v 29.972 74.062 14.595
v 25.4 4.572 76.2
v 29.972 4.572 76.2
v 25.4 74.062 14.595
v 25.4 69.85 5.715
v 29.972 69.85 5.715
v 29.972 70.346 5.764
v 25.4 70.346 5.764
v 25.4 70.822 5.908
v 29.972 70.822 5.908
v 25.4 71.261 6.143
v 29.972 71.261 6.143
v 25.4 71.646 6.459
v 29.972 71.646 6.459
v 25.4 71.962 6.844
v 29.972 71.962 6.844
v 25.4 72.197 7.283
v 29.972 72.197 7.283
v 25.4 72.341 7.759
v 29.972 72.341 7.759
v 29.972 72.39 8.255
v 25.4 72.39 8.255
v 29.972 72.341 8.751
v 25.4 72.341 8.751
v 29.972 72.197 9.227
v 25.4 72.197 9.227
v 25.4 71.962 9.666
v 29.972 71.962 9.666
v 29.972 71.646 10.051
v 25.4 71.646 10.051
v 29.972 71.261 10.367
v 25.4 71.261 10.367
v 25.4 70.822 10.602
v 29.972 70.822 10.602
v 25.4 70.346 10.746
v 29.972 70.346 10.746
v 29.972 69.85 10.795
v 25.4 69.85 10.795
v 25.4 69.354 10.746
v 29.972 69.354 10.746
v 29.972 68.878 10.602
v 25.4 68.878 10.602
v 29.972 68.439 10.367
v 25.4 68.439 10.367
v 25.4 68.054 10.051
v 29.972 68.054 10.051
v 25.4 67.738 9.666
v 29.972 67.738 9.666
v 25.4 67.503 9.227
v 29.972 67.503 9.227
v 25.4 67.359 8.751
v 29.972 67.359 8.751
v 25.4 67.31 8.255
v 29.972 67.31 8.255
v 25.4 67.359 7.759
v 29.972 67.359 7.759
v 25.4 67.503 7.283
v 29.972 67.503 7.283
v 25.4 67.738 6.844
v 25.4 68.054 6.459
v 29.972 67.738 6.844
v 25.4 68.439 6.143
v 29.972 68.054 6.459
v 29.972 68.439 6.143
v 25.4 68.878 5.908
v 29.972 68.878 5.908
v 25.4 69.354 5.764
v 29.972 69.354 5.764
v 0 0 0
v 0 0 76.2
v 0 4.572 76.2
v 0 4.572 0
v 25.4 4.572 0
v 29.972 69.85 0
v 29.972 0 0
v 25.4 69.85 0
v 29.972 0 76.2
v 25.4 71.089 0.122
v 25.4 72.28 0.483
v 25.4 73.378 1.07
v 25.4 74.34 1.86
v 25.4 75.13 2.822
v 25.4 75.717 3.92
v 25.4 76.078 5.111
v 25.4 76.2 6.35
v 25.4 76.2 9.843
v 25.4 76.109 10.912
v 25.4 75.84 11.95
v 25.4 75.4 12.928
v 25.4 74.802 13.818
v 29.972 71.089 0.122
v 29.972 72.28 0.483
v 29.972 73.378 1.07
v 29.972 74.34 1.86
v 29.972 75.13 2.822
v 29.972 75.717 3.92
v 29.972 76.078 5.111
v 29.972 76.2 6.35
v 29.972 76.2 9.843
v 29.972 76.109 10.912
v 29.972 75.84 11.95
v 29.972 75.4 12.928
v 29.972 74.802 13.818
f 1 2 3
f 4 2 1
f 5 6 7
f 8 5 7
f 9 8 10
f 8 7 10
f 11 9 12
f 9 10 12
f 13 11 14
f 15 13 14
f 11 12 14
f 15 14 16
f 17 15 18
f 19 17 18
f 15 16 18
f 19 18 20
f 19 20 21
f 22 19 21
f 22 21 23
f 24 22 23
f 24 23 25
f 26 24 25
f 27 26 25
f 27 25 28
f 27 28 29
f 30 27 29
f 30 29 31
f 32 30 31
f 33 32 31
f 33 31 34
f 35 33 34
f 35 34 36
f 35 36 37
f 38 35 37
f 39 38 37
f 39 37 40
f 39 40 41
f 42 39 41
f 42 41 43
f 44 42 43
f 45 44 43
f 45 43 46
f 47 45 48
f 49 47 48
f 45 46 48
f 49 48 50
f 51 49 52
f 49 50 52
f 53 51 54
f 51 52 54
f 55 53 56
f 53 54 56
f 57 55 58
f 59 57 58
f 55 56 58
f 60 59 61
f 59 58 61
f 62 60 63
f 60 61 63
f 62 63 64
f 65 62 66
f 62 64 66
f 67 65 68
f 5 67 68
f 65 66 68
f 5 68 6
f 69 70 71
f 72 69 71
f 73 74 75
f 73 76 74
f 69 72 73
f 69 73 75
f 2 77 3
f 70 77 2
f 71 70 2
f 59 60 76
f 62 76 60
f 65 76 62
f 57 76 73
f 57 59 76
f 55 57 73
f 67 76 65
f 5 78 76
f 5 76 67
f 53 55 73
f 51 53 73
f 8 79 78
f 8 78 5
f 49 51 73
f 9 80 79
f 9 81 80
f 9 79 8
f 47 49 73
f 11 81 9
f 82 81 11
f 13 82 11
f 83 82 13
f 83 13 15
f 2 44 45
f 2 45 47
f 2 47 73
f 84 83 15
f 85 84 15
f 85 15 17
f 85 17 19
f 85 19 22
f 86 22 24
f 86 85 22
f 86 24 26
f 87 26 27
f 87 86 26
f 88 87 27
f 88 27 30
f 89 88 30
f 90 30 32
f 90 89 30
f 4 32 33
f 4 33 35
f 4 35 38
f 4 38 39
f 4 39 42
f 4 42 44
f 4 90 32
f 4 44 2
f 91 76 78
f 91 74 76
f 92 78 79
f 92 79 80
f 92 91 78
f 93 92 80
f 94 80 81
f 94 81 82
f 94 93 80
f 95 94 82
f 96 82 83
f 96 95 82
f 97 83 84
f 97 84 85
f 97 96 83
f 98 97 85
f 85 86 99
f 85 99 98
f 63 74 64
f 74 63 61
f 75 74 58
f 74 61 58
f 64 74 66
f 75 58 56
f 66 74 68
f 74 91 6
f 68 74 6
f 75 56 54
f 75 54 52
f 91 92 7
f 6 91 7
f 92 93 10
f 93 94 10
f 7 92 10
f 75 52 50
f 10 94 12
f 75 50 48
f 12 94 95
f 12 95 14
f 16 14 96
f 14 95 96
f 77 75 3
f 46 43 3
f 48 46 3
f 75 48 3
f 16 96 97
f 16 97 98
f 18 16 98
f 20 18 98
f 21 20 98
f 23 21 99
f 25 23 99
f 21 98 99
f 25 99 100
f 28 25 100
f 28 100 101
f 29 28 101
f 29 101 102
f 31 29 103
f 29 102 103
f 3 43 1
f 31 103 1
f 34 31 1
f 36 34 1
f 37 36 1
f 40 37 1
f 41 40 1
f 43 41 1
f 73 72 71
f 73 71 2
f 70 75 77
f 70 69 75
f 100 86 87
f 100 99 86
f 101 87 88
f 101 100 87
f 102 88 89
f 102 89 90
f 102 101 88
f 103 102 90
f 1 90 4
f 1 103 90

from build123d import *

# Parameters (mm, degrees)
SKETCH1_W           = 25.4
SKETCH1_H           = 4.572
BOSS_EXTRUDE1_DEPTH = 76.2
BOSS_EXTRUDE3_DEPTH = 4.572
FILLET3_R           = 6.35
SKETCH5_R           = 2.54
CUT_EXTRUDE2_DEPTH  = 112.853479088


with BuildPart() as part:
    # Sketch1 → Boss-Extrude1 (new body)
    with BuildSketch(Plane.XY):
        with Locations((12.7, 2.286)):
            Rectangle(SKETCH1_W, SKETCH1_H)
    extrude(amount=BOSS_EXTRUDE1_DEPTH)

    # Sketch4 → Boss-Extrude3 (add)
    with BuildSketch(Plane(origin=(25.4, 0, 0), x_dir=(0, 0, -1), z_dir=(1, 0, 0))):
        Polygon((-76.2, 0), (-76.2, 4.572), (-12.7, 76.2), (0, 76.2), (0, 0), align=None)
    extrude(amount=BOSS_EXTRUDE3_DEPTH)

    # Fillet3
    fillet3_edges = [part.edges().sort_by_distance(p)[0] for p in [
        (27.686, 76.2, 0),
        (27.686, 76.2, 12.7),
    ]]
    fillet(fillet3_edges, radius=FILLET3_R)

    # Sketch5 → Cut-Extrude2 (cut, through all)
    with BuildSketch(Plane(origin=(29.972, 0, 0), x_dir=(0, 0, -1), z_dir=(1, 0, 0))):
        with Locations((-8.255, 69.85)):
            Circle(SKETCH5_R)
    extrude(amount=-CUT_EXTRUDE2_DEPTH, mode=Mode.SUBTRACT)


solid = part.part
